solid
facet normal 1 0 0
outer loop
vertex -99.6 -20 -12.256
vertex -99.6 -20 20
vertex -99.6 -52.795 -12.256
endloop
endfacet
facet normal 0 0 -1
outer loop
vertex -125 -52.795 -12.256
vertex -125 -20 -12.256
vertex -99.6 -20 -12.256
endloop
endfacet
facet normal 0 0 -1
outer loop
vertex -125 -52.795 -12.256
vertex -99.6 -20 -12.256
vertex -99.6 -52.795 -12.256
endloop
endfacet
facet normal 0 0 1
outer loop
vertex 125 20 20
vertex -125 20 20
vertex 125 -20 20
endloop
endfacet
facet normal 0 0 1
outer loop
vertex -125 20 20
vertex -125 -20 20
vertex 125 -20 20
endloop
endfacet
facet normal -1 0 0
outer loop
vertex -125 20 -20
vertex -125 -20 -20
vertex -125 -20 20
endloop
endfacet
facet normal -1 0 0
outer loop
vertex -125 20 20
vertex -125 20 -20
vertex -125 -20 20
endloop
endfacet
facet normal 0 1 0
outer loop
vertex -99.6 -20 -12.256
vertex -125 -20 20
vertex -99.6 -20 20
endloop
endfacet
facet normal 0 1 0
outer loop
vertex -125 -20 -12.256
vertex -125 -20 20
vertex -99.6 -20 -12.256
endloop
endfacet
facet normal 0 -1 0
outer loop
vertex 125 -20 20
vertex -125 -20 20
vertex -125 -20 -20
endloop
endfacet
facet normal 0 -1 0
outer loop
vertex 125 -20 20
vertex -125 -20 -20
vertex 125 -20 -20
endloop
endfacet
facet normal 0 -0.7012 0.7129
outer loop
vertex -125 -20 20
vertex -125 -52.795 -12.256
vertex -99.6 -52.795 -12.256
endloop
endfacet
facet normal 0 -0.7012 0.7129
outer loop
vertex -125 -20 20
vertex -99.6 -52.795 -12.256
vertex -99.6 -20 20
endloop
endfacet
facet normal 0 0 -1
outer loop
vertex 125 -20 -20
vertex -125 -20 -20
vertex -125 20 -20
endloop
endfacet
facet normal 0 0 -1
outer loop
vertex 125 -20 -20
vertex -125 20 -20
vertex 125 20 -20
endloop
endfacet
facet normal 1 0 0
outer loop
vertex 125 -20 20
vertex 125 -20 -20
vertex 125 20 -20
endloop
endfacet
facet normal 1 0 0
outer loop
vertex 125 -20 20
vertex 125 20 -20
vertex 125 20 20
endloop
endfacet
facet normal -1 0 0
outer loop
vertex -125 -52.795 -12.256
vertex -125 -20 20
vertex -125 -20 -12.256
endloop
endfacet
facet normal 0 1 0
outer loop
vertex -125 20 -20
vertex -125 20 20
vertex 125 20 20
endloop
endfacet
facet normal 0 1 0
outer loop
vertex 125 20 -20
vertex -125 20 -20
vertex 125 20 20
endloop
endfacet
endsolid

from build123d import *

# Parameters (mm, degrees)
F0_W          = 250
F0_H          = 40
F1_DEPTH      = 20
F1_DEPTH_BACK = 20
F3_DEPTH      = 25.4


with BuildPart() as f1:
    # F0 (on Front) → F1 (new body, two sides)
    with BuildSketch(Plane.XZ) as f1_sk:
        Rectangle(F0_W, F0_H)
    extrude(amount=F1_DEPTH)
    extrude(f1_sk.sketch, amount=-F1_DEPTH_BACK)


with BuildPart() as f3:
    # F2 (on face) → F3 (new body)
    with BuildSketch(Plane(origin=(-125, 0, 0), x_dir=(0, -1, 0), z_dir=(-1, 0, 0))):
        Polygon((20, 20), (20, -12.256252), (52.795339, -12.256252), align=None)
    extrude(amount=-F3_DEPTH)


solid = Compound([f1.part, f3.part])
